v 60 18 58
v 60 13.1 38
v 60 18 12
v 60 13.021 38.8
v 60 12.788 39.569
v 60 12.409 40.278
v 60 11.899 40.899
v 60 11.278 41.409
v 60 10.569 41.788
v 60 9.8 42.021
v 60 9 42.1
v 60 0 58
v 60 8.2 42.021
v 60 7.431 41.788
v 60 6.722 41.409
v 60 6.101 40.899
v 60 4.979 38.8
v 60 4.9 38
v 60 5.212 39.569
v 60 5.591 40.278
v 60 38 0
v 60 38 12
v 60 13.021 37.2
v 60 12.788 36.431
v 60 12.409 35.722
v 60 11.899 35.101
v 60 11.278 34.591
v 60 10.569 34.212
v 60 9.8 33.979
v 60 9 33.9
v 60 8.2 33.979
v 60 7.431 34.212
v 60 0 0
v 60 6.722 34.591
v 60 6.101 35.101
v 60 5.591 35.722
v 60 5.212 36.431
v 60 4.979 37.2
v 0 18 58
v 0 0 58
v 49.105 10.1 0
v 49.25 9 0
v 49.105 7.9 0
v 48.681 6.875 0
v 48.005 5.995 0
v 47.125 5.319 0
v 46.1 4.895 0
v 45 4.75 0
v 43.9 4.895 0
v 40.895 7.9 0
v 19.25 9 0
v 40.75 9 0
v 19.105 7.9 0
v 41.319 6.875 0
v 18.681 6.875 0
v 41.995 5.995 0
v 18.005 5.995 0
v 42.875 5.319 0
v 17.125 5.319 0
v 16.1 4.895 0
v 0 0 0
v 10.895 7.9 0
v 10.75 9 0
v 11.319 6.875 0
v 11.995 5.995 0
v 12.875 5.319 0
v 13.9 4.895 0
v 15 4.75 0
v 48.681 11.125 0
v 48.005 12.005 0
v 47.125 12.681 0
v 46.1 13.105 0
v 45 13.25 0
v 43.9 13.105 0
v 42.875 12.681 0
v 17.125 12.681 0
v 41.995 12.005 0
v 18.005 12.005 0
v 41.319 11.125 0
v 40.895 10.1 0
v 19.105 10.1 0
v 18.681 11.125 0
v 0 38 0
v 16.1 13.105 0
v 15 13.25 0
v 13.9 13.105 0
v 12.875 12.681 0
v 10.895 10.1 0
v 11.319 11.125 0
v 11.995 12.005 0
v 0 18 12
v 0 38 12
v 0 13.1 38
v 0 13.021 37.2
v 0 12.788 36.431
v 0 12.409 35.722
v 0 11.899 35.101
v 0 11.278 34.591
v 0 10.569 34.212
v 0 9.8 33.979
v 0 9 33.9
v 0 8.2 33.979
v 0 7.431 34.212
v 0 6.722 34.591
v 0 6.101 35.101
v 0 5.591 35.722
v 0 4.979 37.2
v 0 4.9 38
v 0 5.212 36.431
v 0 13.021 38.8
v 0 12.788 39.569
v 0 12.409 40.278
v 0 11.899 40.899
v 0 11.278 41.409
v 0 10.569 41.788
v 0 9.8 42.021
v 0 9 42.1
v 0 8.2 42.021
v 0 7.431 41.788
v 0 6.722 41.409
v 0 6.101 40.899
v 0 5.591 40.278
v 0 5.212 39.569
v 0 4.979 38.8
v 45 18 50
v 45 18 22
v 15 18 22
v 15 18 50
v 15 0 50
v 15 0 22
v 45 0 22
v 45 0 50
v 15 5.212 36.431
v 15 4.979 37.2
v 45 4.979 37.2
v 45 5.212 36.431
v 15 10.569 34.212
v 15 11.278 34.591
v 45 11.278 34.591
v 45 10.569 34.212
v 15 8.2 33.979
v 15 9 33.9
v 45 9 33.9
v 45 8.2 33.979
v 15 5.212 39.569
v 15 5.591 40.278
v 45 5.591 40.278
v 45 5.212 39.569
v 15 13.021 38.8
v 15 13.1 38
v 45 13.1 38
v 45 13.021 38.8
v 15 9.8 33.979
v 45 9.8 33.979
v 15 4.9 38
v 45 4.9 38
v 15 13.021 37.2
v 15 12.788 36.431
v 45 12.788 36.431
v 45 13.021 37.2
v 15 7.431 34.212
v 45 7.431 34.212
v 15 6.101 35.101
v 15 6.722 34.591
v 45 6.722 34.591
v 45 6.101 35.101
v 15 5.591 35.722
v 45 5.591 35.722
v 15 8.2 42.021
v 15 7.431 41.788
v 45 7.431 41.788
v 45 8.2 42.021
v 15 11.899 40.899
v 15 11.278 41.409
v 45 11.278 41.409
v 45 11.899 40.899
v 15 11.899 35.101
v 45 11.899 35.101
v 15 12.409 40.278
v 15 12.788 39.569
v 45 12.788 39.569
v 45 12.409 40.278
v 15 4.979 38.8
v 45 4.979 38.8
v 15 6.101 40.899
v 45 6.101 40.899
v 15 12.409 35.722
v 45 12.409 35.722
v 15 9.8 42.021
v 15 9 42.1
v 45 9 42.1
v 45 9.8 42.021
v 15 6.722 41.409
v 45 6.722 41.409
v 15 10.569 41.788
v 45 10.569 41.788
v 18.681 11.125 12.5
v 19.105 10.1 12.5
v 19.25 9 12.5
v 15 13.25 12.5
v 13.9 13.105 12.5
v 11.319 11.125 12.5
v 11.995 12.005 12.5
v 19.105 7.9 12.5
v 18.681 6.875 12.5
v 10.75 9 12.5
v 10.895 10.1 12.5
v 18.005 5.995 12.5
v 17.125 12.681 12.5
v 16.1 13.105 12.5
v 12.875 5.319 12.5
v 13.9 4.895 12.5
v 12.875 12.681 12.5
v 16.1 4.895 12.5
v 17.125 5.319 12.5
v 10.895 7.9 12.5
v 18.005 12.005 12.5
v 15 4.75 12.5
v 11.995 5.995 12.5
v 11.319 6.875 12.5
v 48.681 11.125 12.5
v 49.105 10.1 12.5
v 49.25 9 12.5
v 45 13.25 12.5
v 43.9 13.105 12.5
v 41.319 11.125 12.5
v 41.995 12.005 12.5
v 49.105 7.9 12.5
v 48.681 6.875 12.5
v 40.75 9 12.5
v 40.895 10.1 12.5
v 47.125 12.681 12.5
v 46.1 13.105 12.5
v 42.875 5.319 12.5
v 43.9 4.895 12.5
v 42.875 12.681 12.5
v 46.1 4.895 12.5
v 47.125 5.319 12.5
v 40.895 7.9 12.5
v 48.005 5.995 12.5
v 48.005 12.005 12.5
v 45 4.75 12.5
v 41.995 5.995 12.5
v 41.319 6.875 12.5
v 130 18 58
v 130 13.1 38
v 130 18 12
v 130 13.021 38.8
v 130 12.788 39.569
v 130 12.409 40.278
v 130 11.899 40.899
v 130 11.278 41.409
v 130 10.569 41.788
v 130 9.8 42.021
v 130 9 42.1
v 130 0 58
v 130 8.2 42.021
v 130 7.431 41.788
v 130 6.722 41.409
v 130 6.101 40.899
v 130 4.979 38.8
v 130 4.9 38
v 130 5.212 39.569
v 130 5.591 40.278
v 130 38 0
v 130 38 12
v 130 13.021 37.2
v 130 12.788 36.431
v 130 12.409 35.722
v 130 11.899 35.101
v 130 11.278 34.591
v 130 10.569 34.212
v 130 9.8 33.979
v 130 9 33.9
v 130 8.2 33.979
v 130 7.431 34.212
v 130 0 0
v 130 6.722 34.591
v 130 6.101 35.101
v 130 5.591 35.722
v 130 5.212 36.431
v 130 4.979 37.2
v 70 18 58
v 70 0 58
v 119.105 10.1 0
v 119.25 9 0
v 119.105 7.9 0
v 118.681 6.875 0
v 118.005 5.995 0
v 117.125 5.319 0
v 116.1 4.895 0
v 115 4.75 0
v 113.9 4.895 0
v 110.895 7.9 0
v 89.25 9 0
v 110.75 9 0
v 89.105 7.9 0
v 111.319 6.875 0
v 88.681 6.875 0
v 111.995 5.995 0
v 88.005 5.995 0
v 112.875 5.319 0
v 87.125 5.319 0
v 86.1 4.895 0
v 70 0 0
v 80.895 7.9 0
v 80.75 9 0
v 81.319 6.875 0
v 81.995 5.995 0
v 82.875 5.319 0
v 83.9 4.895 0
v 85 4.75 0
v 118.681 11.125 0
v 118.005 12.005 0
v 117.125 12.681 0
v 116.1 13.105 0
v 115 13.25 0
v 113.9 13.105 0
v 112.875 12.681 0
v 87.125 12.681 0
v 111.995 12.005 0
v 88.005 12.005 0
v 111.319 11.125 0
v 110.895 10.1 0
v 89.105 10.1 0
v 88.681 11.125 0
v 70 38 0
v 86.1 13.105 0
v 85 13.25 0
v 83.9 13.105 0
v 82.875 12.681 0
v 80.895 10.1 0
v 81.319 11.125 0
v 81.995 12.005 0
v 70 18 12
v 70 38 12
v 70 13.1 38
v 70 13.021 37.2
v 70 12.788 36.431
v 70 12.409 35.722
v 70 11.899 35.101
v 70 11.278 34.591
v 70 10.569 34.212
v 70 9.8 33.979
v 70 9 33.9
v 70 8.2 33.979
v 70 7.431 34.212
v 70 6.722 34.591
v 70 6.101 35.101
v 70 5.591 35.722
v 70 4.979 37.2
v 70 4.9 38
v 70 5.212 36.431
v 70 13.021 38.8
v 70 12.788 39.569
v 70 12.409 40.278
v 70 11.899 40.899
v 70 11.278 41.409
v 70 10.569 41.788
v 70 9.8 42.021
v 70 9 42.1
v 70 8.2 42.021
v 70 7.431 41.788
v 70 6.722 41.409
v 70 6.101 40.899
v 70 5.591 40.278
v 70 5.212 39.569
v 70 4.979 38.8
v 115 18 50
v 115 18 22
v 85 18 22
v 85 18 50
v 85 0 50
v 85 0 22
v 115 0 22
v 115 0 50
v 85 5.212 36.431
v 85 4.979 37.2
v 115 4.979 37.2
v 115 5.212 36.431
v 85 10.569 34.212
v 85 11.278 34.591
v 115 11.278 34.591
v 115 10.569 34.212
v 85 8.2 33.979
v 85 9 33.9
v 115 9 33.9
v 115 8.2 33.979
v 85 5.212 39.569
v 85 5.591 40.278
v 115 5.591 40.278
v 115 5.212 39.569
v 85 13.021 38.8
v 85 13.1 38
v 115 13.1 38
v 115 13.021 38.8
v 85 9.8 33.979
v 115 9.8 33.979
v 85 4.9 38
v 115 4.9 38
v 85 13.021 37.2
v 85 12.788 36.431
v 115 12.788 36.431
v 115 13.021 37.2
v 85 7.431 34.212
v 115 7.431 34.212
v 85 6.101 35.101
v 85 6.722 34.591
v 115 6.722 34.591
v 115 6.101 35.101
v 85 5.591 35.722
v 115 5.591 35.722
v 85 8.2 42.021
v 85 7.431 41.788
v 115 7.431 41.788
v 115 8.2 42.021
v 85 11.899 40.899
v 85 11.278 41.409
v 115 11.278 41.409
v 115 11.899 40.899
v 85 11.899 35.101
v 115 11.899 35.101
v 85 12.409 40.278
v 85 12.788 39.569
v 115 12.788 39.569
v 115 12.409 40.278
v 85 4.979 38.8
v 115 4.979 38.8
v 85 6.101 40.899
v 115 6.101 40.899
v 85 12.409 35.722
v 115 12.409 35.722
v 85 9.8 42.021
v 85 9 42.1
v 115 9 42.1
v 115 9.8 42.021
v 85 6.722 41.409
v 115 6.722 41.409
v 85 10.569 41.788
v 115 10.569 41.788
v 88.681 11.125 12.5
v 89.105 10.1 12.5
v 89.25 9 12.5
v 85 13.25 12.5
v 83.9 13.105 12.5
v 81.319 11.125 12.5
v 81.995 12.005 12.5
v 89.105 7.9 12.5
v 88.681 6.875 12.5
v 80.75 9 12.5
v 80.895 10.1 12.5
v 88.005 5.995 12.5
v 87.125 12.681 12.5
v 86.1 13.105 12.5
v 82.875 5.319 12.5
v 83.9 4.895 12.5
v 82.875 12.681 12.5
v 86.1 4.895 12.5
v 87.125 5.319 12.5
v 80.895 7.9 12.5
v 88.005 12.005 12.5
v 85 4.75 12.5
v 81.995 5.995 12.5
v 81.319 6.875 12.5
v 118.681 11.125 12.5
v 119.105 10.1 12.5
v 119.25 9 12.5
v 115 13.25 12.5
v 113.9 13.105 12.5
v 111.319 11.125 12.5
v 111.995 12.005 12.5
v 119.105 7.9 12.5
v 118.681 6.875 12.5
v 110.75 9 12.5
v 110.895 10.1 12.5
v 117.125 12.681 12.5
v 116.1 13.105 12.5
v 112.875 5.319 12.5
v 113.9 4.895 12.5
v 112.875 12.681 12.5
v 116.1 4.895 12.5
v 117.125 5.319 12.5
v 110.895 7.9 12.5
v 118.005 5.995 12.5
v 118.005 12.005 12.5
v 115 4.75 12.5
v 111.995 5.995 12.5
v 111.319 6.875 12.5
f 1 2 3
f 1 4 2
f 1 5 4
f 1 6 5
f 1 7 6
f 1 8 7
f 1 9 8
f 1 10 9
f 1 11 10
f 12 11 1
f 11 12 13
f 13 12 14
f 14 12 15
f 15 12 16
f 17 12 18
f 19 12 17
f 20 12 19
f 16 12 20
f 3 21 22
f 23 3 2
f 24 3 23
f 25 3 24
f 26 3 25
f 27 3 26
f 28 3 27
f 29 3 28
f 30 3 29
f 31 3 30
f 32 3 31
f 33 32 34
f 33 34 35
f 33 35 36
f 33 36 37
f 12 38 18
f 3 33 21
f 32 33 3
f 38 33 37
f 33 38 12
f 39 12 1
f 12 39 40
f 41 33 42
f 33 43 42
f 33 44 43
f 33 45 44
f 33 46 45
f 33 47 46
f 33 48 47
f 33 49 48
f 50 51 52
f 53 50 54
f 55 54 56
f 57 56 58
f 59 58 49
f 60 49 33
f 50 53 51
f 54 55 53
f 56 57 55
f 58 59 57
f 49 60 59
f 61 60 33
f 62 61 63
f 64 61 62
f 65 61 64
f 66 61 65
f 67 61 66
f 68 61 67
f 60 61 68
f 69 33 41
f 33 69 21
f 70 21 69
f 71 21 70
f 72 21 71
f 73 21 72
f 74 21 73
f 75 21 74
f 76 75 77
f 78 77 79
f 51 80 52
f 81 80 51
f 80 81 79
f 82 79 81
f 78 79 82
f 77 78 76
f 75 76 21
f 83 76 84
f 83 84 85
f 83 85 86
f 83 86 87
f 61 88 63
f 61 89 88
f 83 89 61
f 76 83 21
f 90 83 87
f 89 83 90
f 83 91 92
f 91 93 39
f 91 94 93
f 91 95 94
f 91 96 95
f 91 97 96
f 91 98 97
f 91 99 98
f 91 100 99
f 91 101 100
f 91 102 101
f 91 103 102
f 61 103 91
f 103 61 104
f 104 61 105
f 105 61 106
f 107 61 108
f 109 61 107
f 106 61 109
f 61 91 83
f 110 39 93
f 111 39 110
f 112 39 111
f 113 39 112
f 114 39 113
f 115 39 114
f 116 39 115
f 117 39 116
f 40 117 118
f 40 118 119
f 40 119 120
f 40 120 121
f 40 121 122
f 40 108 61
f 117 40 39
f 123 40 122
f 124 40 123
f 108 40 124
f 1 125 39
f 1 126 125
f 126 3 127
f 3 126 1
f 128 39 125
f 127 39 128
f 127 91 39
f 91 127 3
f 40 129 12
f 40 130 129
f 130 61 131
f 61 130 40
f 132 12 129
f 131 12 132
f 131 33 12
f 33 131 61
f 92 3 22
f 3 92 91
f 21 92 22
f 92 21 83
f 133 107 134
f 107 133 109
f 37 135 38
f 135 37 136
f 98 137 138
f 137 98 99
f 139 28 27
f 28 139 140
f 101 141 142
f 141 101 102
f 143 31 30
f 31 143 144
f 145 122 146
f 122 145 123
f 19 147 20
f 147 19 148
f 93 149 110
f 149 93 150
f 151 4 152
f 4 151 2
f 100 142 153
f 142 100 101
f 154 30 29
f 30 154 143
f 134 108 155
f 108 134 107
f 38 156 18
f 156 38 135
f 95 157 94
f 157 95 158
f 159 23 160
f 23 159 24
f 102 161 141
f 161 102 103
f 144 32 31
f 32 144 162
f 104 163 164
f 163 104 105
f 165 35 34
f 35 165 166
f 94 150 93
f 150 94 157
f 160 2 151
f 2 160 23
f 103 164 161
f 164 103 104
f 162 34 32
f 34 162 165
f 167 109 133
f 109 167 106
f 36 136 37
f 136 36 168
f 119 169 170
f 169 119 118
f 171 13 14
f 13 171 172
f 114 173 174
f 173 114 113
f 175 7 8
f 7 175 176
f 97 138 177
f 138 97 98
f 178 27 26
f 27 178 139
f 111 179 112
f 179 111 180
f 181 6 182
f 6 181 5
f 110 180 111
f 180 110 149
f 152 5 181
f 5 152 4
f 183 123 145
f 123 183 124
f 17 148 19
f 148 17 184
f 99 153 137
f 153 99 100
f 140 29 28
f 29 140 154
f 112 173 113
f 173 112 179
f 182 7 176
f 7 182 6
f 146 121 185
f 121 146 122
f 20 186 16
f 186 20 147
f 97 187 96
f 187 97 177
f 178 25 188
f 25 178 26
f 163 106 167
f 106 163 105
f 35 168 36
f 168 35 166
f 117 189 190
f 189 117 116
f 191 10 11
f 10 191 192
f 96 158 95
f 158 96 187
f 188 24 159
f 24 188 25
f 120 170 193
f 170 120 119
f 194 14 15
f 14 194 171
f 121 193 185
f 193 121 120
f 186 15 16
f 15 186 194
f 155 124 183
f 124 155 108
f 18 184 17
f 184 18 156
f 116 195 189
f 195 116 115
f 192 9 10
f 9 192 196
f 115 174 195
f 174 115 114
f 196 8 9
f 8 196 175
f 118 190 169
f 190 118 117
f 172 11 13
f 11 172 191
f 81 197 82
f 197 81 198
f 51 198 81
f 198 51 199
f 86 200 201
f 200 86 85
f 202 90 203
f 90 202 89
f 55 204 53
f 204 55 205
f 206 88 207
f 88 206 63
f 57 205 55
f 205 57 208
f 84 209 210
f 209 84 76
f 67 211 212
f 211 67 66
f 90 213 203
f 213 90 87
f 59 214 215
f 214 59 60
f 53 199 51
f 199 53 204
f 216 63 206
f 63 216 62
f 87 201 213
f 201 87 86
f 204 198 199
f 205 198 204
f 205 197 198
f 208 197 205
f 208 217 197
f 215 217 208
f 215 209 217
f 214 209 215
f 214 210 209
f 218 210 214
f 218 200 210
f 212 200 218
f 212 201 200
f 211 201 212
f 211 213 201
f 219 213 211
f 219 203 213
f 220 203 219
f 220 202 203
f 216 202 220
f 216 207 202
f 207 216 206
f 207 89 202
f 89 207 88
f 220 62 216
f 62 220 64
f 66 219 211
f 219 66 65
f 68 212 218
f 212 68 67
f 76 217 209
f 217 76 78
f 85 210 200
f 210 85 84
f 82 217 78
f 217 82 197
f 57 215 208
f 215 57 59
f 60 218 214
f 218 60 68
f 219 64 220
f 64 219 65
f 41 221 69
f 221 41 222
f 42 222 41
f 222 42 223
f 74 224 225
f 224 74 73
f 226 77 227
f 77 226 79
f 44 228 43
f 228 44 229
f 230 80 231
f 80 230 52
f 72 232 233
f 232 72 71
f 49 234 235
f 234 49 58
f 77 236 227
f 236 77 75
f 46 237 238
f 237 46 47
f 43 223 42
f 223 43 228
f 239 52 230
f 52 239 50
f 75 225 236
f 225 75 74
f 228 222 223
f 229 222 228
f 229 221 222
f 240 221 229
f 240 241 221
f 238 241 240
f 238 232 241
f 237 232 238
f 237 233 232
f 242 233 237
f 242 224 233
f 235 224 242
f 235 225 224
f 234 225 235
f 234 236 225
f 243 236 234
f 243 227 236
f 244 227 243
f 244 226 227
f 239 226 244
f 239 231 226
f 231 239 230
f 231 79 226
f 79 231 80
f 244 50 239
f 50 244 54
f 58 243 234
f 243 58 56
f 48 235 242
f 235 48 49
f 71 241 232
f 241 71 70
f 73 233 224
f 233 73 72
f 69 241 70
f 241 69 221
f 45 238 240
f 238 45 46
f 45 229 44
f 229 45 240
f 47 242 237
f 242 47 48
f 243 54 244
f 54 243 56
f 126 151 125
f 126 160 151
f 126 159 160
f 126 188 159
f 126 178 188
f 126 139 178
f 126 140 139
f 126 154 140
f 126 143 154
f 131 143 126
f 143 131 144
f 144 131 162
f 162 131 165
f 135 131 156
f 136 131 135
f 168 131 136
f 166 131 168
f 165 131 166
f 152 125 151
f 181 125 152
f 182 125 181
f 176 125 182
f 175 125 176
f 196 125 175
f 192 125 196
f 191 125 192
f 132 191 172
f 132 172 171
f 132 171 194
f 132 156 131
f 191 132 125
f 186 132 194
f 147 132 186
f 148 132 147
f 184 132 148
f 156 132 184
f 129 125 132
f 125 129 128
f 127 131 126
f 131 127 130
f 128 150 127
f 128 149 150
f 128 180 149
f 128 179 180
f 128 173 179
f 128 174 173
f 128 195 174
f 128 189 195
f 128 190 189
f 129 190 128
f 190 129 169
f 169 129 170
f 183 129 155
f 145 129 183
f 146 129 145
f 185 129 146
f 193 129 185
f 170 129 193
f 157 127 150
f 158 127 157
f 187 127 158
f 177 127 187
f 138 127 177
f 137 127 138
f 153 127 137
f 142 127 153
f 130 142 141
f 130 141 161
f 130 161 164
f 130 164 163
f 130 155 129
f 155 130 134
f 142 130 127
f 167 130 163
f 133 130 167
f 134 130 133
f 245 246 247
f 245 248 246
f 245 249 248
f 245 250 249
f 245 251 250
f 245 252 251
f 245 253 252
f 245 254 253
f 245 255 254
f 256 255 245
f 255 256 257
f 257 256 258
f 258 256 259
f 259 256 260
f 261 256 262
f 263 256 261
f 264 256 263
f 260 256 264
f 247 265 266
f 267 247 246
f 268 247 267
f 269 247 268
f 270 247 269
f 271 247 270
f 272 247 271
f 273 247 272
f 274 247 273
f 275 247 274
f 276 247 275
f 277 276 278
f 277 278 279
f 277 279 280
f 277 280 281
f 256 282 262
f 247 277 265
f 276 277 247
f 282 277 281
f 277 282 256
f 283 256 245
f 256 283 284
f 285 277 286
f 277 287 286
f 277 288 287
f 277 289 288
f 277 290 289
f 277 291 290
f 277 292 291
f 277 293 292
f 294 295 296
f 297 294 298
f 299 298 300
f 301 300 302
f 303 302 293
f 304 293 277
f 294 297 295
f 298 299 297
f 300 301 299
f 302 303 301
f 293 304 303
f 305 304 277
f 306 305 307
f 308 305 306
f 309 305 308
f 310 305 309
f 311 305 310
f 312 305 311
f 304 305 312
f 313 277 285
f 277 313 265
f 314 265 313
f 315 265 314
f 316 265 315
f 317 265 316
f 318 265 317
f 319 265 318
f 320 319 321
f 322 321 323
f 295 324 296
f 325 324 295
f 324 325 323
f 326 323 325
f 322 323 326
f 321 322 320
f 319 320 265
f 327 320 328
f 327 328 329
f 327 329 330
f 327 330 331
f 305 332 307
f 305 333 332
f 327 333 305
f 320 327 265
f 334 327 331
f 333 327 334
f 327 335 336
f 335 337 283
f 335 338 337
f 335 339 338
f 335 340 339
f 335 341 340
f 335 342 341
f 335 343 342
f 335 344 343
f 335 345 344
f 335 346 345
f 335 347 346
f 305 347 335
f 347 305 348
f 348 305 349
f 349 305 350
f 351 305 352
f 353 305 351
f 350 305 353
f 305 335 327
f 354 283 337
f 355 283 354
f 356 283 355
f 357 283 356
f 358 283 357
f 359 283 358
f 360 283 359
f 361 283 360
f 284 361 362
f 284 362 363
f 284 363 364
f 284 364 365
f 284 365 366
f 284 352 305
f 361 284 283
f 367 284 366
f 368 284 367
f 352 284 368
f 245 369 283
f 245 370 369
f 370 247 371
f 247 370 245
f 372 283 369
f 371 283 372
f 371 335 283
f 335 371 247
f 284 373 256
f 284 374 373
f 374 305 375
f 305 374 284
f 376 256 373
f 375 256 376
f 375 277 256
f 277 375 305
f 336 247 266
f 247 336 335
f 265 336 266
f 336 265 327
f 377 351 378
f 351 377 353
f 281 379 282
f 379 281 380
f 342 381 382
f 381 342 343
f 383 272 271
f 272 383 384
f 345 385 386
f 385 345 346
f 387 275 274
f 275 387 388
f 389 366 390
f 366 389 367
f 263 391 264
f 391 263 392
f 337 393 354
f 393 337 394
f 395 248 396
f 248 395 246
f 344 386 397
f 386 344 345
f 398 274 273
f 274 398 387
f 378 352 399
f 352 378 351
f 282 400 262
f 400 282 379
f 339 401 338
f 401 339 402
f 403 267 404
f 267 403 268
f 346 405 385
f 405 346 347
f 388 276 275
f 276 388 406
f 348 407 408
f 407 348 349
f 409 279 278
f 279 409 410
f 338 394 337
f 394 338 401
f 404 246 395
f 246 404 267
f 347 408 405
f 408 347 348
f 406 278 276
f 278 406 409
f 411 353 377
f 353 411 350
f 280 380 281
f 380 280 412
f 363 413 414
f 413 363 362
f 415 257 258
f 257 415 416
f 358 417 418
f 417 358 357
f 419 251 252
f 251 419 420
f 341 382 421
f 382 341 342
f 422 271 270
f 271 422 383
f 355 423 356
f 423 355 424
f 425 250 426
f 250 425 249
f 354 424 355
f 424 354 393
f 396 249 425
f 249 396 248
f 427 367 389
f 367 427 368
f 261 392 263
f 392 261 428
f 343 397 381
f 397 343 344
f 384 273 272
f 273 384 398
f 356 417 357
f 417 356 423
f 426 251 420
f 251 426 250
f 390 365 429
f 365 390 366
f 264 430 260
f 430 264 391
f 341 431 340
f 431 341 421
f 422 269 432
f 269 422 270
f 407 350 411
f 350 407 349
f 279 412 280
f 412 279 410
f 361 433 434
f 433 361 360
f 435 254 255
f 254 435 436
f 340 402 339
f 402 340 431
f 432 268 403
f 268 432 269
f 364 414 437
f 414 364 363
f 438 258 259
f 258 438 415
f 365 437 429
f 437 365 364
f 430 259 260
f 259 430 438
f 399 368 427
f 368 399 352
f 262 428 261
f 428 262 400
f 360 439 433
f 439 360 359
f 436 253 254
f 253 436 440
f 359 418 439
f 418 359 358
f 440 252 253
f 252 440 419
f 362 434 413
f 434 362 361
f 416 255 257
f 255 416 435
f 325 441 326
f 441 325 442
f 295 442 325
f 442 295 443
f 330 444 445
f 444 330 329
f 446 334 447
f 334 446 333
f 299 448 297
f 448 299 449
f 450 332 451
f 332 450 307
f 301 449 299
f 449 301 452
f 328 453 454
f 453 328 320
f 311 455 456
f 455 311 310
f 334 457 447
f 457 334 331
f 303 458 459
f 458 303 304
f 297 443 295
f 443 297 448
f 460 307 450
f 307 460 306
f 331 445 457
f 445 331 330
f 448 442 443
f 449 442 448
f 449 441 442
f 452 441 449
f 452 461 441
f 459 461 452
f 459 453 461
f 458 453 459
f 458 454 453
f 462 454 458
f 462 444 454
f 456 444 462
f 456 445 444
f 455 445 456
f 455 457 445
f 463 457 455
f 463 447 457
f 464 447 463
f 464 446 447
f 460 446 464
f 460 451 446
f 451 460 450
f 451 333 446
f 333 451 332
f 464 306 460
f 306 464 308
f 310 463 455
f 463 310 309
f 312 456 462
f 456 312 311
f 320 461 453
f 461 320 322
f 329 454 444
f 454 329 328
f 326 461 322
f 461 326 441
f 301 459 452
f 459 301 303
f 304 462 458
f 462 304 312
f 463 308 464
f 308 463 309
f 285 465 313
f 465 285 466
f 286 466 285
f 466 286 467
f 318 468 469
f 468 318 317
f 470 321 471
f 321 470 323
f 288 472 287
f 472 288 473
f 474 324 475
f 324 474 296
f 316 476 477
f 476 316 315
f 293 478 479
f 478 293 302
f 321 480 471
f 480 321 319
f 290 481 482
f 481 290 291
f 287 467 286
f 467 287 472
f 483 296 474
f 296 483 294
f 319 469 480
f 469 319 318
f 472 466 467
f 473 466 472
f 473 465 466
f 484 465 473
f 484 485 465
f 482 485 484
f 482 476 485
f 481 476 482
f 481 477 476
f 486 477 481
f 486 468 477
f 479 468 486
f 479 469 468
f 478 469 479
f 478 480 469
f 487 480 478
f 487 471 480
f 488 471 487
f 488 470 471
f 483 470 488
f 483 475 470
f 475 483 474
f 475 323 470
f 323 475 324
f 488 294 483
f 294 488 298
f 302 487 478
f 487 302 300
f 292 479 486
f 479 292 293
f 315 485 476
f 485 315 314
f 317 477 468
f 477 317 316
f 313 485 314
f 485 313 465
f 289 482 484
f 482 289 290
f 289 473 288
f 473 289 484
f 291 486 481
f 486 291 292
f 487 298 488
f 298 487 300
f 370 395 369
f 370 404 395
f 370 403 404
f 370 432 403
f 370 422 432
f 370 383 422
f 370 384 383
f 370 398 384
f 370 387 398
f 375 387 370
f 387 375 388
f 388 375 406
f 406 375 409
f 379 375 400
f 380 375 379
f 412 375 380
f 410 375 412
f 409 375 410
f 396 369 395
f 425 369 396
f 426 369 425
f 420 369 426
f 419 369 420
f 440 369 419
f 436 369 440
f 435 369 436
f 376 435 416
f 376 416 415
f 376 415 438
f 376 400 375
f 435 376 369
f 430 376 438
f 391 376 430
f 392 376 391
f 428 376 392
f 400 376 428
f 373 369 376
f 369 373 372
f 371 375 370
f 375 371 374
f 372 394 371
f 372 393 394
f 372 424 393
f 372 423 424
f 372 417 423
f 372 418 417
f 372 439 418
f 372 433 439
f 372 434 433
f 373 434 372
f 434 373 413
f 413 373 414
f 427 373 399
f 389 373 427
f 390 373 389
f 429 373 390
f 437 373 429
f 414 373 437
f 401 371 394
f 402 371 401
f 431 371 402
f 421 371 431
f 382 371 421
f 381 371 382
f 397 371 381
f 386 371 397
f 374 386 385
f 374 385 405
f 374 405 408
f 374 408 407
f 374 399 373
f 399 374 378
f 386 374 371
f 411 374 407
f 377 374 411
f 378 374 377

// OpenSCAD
// ============================================================
// HEM-001 — Latitude Adjustment Base: HINGE BRACKET
// One of a matched pair. Pivots the altitude plate on the
// azimuth plate. Print/machine 2 identical parts.
// Material: 6061-T6 Aluminium, machined from 80×60×20mm block
// Part No: HEM-LAT-003 (qty 2)
// Revision: 1.0 | 2026-06
// ============================================================
//
// GEOMETRY:
// The bracket is an L-shape or U-clamp that:
//   - Bolts to the AZIMUTH plate (M8 × 2 per bracket, down through)
//   - Provides a precision Ø8mm pivot bore for the M8 hinge bolt
//   - The altitude plate pivot hole aligns with this bore
//
// The pivot bolt is a shoulder bolt or precision ground M8 bolt
// with a Ø8mm h6 shoulder and M8 thread at the end.
// A 6205 bearing (25×52×15mm) can be substituted at each pivot
// for zero-slop rotation — recommended for imaging builds.
//
// For the 6205 bearing option:
//   PIVOT_BORE = 52.05mm (H7) and a 25mm shoulder bolt is used.
// Default here uses a simple M8 pivot bolt (adequate for visual
// and casual imaging use).
// ============================================================

// ---- PARAMETERS ----

// Bracket body
BODY_W  = 60;    // mm — bracket width (left-right)
BODY_H  = 70;    // mm — bracket height (vertical)
BODY_T  = 18;    // mm — bracket thickness (fore-aft)

// Pivot bore (M8 shoulder or precision bolt)
PIVOT_BORE      = 8.2;    // mm — M8 clearance for pivot bolt
// For 6205 bearing upgrade: set to 52.05mm and change PIVOT_H accordingly
PIVOT_H         = BODY_W; // pivot bore runs full width of bracket

// Azimuth plate attachment bolts (2× M8 tapped into az plate)
AZ_BOLT_SPACING = 40;     // mm — spacing between two bolts, along bracket length
AZ_BOLT_BORE    = 8.5;    // mm — M8 clearance through bracket foot
AZ_BOLT_INSET   = 15;     // mm — inset from each end of foot

// Alt plate contact face (top of bracket — where alt plate rests on pivot)
// No fasteners here — alt plate is free to pivot about the bolt

// Foot thickness (where bracket bolts to az plate)
FOOT_T  = 12;    // mm — foot thickness
FOOT_W  = BODY_W;

// ---- GEOMETRY ----

module hinge_bracket() {
    difference() {
        union() {
            // Main vertical body
            cube([BODY_W, BODY_T, BODY_H - FOOT_T]);

            // Foot (extends forward for bolt access)
            translate([0, 0, 0])
                cube([FOOT_W, BODY_T + 20, FOOT_T]);
        }

        // ---- PIVOT BORE (horizontal — runs through bracket width) ----
        // Located at top of vertical body
        translate([-0.5, BODY_T/2, BODY_H - FOOT_T - 20])
            rotate([0, 90, 0])
                cylinder(d=PIVOT_BORE, h=BODY_W+1, $fn=32);

        // ---- AZ PLATE ATTACHMENT BOLTS (2× M8 through foot) ----
        translate([AZ_BOLT_INSET, BODY_T/2, -0.5])
            cylinder(d=AZ_BOLT_BORE, h=FOOT_T+1, $fn=24);
        translate([BODY_W - AZ_BOLT_INSET, BODY_T/2, -0.5])
            cylinder(d=AZ_BOLT_BORE, h=FOOT_T+1, $fn=24);

        // ---- LIGHTENING SLOT (optional — central body) ----
        translate([15, -0.5, FOOT_T + 10])
            cube([BODY_W - 30, BODY_T + 1, BODY_H - FOOT_T - 30]);
    }
}

hinge_bracket();

// Render second bracket alongside for reference
translate([BODY_W + 10, 0, 0]) hinge_bracket();
